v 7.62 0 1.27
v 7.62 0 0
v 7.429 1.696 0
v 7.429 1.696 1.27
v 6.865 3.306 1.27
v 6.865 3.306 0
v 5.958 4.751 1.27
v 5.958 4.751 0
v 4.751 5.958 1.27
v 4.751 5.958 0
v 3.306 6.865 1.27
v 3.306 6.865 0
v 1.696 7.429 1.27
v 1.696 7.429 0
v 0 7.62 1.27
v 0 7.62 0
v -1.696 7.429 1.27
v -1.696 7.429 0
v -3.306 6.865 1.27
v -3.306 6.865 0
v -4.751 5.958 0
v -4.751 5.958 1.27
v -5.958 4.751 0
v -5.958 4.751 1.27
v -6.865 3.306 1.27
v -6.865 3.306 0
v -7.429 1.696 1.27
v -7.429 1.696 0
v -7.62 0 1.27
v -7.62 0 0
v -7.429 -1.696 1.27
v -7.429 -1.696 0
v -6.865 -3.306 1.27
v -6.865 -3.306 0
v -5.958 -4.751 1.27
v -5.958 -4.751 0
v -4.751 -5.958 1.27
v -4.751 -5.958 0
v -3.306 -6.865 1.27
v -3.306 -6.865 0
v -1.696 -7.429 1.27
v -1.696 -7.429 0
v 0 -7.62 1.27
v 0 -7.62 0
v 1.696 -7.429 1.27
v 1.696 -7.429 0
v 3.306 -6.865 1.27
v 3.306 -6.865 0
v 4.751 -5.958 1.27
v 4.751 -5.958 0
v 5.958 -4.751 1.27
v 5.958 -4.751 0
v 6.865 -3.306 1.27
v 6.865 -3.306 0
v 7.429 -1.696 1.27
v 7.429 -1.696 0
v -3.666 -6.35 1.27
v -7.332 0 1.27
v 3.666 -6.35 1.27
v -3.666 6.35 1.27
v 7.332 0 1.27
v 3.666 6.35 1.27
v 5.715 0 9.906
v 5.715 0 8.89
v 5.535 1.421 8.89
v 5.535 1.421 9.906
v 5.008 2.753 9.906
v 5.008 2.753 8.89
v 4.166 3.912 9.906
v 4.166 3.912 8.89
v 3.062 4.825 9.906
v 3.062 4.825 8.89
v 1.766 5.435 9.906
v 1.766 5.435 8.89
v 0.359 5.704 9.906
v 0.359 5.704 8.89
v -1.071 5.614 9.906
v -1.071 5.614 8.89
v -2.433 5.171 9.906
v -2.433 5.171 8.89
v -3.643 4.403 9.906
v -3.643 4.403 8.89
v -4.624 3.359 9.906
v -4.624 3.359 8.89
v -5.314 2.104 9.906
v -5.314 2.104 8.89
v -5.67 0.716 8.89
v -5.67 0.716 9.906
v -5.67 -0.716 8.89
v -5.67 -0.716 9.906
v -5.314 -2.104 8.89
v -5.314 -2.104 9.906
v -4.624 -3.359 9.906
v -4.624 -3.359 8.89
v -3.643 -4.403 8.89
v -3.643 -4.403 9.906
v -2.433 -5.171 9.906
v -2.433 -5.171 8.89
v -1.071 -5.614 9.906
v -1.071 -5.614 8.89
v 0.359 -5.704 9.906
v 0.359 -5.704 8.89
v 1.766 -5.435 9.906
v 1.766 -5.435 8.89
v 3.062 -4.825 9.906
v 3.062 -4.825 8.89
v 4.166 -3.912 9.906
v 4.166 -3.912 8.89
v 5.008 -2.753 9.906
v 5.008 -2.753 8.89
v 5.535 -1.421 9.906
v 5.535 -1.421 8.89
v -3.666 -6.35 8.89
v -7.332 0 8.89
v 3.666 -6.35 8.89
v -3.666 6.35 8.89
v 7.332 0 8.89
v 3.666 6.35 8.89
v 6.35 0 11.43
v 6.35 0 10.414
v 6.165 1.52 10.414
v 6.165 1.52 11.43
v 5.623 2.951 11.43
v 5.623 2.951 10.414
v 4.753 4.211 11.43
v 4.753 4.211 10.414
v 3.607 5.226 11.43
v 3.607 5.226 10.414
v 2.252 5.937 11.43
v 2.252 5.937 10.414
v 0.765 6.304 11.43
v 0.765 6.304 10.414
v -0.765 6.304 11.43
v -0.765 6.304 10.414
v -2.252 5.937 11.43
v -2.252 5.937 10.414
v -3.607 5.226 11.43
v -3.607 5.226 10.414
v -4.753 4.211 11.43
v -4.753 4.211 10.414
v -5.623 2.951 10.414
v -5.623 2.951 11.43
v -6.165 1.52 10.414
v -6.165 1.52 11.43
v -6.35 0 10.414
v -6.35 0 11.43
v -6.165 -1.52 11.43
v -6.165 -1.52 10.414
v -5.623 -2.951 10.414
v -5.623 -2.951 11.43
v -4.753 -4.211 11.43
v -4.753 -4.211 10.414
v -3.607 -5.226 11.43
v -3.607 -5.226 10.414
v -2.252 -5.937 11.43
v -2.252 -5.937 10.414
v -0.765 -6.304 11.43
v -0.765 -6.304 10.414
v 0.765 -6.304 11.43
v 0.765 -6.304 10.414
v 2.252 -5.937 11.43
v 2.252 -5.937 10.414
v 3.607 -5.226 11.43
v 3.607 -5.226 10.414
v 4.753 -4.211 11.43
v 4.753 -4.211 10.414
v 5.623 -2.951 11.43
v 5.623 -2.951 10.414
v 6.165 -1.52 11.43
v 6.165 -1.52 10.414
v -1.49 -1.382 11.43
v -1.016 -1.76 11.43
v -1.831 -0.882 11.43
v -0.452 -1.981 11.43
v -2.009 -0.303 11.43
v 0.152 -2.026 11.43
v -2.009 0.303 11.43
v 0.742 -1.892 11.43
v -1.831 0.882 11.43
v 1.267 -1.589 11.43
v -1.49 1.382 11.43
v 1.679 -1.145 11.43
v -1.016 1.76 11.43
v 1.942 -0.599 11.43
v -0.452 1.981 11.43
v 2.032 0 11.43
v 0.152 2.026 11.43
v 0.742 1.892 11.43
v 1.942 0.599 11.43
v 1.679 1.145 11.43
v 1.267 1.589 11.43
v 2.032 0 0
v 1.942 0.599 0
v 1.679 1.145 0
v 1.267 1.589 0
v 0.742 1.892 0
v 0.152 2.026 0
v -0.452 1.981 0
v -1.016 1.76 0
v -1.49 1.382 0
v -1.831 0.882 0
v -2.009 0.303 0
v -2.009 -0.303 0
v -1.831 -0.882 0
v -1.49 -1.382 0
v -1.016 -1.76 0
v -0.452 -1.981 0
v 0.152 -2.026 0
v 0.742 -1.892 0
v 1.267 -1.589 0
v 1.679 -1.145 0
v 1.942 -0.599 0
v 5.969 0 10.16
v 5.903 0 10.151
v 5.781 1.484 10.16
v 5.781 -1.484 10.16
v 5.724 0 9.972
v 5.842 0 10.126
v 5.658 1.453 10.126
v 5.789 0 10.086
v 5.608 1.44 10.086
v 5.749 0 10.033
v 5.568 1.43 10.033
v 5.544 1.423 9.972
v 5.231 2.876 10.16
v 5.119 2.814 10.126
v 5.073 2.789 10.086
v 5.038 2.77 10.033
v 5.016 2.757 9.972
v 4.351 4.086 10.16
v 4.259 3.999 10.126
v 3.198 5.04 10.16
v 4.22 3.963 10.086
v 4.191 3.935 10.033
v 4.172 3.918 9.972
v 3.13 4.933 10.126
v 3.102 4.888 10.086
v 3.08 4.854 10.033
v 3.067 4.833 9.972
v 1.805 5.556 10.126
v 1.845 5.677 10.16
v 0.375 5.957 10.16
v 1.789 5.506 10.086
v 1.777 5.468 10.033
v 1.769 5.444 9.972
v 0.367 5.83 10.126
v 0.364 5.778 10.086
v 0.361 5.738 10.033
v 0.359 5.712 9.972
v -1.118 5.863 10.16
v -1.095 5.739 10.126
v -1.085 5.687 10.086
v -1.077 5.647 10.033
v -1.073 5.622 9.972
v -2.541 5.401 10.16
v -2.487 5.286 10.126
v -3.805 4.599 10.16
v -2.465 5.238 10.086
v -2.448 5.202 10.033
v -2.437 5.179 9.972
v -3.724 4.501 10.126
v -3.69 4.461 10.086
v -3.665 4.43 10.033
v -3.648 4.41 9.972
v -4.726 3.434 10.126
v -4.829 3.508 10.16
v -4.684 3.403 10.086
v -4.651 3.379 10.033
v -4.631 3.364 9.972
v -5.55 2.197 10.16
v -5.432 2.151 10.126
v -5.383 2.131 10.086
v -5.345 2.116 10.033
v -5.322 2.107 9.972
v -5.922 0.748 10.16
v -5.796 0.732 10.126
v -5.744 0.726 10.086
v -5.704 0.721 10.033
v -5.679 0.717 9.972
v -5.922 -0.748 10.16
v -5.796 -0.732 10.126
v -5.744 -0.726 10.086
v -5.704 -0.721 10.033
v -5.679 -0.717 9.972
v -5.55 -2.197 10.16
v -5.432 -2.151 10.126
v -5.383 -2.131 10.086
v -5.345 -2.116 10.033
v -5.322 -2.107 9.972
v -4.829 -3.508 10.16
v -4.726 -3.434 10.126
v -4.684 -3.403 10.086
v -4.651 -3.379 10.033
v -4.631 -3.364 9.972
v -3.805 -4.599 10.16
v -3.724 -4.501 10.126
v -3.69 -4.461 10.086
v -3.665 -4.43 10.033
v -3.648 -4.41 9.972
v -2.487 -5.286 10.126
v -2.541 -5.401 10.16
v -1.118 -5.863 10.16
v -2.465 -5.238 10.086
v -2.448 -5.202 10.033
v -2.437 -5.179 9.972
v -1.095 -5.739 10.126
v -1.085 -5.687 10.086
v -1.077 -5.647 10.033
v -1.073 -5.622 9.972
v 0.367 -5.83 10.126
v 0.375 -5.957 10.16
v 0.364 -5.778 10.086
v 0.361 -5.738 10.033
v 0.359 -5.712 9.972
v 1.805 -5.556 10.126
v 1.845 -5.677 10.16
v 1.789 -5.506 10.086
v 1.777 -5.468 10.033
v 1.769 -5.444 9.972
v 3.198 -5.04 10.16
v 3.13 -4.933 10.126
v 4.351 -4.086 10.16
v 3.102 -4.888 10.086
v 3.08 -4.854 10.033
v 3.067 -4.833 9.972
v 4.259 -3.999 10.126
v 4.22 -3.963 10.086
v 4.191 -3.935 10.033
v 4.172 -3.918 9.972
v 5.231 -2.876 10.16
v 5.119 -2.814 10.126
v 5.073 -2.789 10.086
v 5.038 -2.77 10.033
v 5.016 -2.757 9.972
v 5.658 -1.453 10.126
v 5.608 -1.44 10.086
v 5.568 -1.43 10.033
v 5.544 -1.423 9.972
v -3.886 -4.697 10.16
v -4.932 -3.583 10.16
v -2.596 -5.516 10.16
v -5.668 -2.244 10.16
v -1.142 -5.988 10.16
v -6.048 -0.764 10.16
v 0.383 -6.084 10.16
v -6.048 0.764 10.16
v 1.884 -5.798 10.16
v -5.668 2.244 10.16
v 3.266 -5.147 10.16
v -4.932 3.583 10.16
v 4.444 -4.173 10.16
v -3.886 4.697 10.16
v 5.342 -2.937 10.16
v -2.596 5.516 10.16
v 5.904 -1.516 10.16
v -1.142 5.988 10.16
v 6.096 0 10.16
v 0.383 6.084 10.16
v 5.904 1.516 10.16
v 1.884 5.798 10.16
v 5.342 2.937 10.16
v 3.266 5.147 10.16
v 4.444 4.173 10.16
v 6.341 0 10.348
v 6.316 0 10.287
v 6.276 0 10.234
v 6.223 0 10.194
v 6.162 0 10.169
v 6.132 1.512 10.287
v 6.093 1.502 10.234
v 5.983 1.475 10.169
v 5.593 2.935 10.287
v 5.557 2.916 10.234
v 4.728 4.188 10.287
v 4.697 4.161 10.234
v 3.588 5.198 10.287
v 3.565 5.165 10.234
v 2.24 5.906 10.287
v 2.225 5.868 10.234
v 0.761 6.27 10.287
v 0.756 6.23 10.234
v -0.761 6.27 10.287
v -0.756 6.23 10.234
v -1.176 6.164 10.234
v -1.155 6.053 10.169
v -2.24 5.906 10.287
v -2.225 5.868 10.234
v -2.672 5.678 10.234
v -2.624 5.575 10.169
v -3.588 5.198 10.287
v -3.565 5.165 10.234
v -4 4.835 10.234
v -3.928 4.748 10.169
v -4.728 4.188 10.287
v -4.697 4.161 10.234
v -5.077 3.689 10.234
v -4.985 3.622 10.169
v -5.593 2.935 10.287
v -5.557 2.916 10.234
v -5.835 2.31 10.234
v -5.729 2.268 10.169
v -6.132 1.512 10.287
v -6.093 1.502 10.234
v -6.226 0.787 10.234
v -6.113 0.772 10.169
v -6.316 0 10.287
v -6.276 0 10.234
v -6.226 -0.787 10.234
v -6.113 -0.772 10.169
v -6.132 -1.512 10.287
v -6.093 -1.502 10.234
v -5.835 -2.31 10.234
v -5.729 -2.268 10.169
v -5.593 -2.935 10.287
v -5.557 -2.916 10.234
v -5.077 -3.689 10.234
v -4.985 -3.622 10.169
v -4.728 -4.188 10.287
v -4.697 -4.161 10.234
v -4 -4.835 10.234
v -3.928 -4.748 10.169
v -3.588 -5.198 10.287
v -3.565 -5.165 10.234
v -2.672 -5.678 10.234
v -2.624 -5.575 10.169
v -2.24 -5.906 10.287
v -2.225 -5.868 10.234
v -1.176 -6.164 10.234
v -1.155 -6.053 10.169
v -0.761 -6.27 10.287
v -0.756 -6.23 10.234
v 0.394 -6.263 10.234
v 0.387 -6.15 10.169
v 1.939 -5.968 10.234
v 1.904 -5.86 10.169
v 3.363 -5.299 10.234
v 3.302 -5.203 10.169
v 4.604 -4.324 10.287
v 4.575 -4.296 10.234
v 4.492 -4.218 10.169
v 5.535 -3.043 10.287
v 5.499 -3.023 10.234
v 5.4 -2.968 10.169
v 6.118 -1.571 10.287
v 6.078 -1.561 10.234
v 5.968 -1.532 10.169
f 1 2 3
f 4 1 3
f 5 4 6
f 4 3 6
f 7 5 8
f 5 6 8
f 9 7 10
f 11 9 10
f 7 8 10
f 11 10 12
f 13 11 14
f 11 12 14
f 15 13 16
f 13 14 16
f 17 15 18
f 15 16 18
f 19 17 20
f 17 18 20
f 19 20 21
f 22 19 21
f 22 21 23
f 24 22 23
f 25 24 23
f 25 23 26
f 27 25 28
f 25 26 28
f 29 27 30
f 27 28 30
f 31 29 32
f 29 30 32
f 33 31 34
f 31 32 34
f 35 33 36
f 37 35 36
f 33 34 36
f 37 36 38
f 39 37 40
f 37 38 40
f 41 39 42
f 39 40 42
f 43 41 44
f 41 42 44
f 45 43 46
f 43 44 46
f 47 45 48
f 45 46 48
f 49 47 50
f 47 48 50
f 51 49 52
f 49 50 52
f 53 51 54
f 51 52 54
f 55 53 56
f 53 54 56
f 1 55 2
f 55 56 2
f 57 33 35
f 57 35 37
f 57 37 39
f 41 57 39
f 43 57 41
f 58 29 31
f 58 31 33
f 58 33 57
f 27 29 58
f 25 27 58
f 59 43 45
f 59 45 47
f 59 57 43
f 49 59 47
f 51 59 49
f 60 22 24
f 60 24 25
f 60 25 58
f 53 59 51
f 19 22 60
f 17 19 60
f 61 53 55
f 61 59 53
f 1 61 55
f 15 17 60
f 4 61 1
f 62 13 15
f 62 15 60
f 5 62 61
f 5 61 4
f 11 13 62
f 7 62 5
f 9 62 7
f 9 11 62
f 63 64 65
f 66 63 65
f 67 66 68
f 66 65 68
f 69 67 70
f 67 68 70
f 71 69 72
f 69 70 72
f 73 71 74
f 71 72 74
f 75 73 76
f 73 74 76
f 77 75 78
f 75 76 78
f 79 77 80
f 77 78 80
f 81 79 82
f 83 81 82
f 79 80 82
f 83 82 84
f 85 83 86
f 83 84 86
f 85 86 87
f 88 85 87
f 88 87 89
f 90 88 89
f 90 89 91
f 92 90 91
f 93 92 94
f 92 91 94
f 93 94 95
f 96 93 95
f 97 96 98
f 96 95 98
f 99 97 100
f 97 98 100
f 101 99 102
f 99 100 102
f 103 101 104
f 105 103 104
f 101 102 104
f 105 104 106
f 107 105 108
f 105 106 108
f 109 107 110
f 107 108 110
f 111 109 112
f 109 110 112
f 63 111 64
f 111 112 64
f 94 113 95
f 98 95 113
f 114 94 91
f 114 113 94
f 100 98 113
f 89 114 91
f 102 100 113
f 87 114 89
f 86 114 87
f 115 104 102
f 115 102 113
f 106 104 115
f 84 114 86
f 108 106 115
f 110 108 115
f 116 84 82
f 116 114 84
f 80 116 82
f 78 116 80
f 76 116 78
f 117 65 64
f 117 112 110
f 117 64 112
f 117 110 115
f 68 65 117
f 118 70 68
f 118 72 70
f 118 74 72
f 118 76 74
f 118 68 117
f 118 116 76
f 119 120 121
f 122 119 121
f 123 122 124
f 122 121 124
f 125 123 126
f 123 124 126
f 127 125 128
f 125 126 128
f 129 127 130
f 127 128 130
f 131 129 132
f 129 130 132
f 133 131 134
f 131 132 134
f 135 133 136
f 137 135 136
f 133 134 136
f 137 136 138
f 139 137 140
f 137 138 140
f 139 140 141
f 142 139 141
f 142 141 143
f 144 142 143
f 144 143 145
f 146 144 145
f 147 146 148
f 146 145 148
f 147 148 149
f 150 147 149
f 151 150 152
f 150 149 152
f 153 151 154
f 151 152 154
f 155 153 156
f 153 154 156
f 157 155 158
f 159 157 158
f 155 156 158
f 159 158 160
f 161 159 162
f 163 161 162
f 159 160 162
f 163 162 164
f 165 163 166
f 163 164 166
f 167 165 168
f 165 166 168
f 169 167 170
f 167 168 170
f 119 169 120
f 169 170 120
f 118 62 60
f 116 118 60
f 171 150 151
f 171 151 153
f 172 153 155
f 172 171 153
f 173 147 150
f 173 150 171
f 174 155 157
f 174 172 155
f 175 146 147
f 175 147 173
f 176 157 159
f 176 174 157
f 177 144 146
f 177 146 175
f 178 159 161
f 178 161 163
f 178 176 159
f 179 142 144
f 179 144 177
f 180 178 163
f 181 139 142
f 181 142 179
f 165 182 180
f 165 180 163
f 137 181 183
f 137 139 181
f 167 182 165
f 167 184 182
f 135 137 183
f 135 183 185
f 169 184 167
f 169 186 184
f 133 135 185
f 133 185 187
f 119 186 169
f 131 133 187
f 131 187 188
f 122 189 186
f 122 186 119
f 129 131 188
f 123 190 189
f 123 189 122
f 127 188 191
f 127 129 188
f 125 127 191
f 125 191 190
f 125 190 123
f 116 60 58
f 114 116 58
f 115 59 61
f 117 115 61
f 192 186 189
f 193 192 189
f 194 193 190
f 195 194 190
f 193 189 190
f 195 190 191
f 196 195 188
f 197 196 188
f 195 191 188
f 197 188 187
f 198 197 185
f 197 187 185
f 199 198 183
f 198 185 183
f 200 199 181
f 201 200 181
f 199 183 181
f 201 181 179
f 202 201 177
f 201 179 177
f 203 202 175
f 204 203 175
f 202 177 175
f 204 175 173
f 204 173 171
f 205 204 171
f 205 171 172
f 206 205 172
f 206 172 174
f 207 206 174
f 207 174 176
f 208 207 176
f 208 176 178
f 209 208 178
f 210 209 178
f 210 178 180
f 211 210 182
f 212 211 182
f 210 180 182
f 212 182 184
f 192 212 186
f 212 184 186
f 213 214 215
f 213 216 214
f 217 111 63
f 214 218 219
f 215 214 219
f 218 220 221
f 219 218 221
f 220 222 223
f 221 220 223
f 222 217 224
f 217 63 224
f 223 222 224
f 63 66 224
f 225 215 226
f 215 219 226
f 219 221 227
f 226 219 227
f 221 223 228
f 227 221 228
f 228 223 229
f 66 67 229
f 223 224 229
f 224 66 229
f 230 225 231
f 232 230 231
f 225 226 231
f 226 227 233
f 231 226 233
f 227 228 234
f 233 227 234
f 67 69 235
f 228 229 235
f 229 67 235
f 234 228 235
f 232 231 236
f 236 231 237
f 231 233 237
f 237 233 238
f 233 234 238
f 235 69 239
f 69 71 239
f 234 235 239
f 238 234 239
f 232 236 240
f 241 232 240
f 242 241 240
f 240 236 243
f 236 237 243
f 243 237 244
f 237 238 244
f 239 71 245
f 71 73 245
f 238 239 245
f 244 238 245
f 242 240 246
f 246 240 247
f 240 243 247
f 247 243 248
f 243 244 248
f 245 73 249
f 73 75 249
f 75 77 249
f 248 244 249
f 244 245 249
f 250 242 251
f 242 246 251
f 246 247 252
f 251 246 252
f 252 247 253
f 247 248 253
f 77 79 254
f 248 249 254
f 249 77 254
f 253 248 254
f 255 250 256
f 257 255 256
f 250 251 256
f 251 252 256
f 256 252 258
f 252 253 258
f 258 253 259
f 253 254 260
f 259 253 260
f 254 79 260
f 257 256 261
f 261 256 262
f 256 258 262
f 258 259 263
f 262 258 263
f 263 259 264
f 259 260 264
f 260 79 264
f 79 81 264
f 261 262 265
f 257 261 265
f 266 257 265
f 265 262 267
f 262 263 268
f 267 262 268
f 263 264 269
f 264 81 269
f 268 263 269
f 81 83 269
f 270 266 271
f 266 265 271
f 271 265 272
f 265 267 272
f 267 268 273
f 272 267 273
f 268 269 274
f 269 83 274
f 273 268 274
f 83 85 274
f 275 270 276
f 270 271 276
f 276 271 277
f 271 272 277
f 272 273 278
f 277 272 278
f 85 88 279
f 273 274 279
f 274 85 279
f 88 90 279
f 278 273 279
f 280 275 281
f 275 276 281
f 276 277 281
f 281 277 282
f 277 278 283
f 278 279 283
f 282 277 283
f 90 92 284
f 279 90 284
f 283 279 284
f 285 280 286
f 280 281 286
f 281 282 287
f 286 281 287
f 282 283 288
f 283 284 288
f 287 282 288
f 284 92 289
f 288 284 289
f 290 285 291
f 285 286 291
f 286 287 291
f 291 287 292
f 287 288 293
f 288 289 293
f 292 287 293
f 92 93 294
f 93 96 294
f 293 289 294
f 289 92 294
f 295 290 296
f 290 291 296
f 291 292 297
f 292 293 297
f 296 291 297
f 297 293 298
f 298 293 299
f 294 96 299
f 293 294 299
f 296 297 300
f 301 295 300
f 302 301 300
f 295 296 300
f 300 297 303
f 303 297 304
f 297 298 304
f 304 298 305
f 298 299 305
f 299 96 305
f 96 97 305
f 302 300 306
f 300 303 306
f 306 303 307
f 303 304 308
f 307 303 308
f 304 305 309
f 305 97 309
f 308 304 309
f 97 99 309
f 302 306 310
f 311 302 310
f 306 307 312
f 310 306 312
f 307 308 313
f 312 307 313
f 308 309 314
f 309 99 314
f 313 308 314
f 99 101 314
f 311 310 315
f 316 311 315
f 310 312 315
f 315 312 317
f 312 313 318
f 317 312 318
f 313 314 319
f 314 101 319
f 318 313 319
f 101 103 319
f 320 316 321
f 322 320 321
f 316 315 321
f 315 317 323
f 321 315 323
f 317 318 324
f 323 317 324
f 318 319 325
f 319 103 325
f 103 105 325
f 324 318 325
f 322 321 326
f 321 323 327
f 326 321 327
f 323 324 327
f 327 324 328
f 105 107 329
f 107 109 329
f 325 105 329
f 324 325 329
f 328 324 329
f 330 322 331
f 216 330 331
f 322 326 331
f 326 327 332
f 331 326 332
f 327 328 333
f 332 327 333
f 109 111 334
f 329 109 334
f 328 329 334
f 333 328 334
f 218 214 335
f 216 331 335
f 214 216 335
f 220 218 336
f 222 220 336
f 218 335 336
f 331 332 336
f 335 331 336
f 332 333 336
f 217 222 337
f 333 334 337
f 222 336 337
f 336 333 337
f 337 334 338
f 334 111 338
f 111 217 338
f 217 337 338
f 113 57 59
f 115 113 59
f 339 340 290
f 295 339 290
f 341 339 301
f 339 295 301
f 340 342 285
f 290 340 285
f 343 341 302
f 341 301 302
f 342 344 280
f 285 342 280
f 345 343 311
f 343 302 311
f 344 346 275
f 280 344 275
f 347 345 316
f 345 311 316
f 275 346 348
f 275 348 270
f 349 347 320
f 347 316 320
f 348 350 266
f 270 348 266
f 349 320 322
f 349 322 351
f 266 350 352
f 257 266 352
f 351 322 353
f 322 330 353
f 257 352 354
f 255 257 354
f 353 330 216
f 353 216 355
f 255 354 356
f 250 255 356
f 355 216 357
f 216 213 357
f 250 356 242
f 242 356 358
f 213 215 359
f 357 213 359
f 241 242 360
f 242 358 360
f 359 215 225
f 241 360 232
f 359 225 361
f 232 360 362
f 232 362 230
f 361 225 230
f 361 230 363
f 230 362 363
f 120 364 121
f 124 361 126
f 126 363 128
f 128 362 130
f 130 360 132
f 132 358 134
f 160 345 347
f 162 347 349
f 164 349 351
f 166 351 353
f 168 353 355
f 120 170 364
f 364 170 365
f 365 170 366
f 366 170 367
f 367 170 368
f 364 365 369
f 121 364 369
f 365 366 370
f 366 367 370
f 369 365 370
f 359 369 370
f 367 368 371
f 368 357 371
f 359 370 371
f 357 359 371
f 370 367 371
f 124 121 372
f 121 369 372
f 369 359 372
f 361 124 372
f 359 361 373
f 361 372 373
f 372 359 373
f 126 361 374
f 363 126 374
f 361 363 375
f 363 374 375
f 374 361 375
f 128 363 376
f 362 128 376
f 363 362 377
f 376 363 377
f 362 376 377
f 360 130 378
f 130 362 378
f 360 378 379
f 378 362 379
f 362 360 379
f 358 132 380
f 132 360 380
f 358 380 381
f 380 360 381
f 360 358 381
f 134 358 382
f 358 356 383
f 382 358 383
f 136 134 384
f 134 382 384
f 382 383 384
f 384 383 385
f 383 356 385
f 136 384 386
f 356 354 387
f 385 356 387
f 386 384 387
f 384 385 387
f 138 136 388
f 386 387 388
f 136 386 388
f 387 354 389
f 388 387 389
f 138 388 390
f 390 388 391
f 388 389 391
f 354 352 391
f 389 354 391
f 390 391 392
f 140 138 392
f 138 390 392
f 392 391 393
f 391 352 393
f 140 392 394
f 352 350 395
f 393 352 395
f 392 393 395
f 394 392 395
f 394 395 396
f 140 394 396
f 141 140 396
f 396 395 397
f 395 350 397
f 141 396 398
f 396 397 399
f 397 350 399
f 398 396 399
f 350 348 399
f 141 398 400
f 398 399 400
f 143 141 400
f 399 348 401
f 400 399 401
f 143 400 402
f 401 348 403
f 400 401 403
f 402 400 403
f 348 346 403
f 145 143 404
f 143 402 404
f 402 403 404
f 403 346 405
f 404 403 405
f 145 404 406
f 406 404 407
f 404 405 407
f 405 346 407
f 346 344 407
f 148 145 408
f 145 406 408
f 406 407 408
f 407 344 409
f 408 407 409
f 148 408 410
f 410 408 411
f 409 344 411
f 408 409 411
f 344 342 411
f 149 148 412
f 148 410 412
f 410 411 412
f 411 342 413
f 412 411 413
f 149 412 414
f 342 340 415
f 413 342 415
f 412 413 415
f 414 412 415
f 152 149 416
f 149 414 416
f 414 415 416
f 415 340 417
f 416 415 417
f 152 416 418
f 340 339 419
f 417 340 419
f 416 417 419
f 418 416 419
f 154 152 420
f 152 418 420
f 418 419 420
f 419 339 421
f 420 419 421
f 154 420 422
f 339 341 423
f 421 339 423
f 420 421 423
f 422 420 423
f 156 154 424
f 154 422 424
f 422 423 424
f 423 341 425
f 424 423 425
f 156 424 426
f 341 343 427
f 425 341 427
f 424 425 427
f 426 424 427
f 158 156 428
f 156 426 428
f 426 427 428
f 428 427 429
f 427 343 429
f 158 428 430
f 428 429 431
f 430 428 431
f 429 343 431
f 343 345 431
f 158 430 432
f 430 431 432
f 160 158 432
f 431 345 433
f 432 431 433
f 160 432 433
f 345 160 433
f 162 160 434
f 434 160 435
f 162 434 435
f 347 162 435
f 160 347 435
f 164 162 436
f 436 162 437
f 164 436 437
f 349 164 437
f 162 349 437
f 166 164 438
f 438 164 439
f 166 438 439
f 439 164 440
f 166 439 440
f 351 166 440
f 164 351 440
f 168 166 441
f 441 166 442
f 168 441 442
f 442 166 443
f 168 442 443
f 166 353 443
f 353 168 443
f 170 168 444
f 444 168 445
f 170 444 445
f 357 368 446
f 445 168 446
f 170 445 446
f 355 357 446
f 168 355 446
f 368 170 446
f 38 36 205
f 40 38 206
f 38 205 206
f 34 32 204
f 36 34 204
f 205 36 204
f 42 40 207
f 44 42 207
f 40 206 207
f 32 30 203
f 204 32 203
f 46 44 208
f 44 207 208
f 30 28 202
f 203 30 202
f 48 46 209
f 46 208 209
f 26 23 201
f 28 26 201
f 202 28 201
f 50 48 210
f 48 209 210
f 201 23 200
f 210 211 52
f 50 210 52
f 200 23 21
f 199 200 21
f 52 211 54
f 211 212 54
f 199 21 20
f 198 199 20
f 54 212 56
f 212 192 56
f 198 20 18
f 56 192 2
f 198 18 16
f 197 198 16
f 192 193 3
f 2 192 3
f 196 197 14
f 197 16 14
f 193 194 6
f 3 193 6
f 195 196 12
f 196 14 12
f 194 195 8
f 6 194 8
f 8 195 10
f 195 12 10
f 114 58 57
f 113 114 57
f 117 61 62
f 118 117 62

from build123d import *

# Parameters (mm, degrees)
SKETCH1_R           = 7.62
BOSS_EXTRUDE1_DEPTH = 1.27
BOSS_EXTRUDE2_DEPTH = 7.62
SKETCH3_R           = 5.715
BOSS_EXTRUDE3_DEPTH = 1.27
SKETCH4_R           = 6.35
BOSS_EXTRUDE4_DEPTH = 1.27
FILLET1_R           = 0.254
SKETCH5_R           = 2.032
CUT_EXTRUDE1_DEPTH  = 11.43


with BuildPart() as part:
    # Sketch1 → Boss-Extrude1 (new body)
    with BuildSketch(Plane.XY):
        Circle(SKETCH1_R)
    extrude(amount=BOSS_EXTRUDE1_DEPTH)

    # Sketch2 → Boss-Extrude2 (add)
    with BuildSketch(Plane.XY.offset(1.27)):
        Polygon((3.666174209, 6.35), (-3.666174209, 6.35), (-7.332348419, 0), (-3.666174209, -6.35), (3.666174209, -6.35), (7.332348419, 0), align=None)
    extrude(amount=BOSS_EXTRUDE2_DEPTH)

    # Sketch3 → Boss-Extrude3 (add)
    with BuildSketch(Plane.XY.offset(8.89)):
        Circle(SKETCH3_R)
    extrude(amount=BOSS_EXTRUDE3_DEPTH)

    # Sketch4 → Boss-Extrude4 (add)
    with BuildSketch(Plane.XY.offset(10.16)):
        Circle(SKETCH4_R)
    extrude(amount=BOSS_EXTRUDE4_DEPTH)

    # Fillet1
    fillet1_edges = [part.edges().sort_by_distance(p)[0] for p in [
        (-5.715, 0, 10.16),
        (-6.35, 0, 10.16),
    ]]
    fillet(fillet1_edges, radius=FILLET1_R)

    # Sketch5 → Cut-Extrude1 (cut)
    with BuildSketch(Plane.XY.offset(11.43)):
        Circle(SKETCH5_R)
    extrude(amount=-CUT_EXTRUDE1_DEPTH, mode=Mode.SUBTRACT)


solid = part.part
